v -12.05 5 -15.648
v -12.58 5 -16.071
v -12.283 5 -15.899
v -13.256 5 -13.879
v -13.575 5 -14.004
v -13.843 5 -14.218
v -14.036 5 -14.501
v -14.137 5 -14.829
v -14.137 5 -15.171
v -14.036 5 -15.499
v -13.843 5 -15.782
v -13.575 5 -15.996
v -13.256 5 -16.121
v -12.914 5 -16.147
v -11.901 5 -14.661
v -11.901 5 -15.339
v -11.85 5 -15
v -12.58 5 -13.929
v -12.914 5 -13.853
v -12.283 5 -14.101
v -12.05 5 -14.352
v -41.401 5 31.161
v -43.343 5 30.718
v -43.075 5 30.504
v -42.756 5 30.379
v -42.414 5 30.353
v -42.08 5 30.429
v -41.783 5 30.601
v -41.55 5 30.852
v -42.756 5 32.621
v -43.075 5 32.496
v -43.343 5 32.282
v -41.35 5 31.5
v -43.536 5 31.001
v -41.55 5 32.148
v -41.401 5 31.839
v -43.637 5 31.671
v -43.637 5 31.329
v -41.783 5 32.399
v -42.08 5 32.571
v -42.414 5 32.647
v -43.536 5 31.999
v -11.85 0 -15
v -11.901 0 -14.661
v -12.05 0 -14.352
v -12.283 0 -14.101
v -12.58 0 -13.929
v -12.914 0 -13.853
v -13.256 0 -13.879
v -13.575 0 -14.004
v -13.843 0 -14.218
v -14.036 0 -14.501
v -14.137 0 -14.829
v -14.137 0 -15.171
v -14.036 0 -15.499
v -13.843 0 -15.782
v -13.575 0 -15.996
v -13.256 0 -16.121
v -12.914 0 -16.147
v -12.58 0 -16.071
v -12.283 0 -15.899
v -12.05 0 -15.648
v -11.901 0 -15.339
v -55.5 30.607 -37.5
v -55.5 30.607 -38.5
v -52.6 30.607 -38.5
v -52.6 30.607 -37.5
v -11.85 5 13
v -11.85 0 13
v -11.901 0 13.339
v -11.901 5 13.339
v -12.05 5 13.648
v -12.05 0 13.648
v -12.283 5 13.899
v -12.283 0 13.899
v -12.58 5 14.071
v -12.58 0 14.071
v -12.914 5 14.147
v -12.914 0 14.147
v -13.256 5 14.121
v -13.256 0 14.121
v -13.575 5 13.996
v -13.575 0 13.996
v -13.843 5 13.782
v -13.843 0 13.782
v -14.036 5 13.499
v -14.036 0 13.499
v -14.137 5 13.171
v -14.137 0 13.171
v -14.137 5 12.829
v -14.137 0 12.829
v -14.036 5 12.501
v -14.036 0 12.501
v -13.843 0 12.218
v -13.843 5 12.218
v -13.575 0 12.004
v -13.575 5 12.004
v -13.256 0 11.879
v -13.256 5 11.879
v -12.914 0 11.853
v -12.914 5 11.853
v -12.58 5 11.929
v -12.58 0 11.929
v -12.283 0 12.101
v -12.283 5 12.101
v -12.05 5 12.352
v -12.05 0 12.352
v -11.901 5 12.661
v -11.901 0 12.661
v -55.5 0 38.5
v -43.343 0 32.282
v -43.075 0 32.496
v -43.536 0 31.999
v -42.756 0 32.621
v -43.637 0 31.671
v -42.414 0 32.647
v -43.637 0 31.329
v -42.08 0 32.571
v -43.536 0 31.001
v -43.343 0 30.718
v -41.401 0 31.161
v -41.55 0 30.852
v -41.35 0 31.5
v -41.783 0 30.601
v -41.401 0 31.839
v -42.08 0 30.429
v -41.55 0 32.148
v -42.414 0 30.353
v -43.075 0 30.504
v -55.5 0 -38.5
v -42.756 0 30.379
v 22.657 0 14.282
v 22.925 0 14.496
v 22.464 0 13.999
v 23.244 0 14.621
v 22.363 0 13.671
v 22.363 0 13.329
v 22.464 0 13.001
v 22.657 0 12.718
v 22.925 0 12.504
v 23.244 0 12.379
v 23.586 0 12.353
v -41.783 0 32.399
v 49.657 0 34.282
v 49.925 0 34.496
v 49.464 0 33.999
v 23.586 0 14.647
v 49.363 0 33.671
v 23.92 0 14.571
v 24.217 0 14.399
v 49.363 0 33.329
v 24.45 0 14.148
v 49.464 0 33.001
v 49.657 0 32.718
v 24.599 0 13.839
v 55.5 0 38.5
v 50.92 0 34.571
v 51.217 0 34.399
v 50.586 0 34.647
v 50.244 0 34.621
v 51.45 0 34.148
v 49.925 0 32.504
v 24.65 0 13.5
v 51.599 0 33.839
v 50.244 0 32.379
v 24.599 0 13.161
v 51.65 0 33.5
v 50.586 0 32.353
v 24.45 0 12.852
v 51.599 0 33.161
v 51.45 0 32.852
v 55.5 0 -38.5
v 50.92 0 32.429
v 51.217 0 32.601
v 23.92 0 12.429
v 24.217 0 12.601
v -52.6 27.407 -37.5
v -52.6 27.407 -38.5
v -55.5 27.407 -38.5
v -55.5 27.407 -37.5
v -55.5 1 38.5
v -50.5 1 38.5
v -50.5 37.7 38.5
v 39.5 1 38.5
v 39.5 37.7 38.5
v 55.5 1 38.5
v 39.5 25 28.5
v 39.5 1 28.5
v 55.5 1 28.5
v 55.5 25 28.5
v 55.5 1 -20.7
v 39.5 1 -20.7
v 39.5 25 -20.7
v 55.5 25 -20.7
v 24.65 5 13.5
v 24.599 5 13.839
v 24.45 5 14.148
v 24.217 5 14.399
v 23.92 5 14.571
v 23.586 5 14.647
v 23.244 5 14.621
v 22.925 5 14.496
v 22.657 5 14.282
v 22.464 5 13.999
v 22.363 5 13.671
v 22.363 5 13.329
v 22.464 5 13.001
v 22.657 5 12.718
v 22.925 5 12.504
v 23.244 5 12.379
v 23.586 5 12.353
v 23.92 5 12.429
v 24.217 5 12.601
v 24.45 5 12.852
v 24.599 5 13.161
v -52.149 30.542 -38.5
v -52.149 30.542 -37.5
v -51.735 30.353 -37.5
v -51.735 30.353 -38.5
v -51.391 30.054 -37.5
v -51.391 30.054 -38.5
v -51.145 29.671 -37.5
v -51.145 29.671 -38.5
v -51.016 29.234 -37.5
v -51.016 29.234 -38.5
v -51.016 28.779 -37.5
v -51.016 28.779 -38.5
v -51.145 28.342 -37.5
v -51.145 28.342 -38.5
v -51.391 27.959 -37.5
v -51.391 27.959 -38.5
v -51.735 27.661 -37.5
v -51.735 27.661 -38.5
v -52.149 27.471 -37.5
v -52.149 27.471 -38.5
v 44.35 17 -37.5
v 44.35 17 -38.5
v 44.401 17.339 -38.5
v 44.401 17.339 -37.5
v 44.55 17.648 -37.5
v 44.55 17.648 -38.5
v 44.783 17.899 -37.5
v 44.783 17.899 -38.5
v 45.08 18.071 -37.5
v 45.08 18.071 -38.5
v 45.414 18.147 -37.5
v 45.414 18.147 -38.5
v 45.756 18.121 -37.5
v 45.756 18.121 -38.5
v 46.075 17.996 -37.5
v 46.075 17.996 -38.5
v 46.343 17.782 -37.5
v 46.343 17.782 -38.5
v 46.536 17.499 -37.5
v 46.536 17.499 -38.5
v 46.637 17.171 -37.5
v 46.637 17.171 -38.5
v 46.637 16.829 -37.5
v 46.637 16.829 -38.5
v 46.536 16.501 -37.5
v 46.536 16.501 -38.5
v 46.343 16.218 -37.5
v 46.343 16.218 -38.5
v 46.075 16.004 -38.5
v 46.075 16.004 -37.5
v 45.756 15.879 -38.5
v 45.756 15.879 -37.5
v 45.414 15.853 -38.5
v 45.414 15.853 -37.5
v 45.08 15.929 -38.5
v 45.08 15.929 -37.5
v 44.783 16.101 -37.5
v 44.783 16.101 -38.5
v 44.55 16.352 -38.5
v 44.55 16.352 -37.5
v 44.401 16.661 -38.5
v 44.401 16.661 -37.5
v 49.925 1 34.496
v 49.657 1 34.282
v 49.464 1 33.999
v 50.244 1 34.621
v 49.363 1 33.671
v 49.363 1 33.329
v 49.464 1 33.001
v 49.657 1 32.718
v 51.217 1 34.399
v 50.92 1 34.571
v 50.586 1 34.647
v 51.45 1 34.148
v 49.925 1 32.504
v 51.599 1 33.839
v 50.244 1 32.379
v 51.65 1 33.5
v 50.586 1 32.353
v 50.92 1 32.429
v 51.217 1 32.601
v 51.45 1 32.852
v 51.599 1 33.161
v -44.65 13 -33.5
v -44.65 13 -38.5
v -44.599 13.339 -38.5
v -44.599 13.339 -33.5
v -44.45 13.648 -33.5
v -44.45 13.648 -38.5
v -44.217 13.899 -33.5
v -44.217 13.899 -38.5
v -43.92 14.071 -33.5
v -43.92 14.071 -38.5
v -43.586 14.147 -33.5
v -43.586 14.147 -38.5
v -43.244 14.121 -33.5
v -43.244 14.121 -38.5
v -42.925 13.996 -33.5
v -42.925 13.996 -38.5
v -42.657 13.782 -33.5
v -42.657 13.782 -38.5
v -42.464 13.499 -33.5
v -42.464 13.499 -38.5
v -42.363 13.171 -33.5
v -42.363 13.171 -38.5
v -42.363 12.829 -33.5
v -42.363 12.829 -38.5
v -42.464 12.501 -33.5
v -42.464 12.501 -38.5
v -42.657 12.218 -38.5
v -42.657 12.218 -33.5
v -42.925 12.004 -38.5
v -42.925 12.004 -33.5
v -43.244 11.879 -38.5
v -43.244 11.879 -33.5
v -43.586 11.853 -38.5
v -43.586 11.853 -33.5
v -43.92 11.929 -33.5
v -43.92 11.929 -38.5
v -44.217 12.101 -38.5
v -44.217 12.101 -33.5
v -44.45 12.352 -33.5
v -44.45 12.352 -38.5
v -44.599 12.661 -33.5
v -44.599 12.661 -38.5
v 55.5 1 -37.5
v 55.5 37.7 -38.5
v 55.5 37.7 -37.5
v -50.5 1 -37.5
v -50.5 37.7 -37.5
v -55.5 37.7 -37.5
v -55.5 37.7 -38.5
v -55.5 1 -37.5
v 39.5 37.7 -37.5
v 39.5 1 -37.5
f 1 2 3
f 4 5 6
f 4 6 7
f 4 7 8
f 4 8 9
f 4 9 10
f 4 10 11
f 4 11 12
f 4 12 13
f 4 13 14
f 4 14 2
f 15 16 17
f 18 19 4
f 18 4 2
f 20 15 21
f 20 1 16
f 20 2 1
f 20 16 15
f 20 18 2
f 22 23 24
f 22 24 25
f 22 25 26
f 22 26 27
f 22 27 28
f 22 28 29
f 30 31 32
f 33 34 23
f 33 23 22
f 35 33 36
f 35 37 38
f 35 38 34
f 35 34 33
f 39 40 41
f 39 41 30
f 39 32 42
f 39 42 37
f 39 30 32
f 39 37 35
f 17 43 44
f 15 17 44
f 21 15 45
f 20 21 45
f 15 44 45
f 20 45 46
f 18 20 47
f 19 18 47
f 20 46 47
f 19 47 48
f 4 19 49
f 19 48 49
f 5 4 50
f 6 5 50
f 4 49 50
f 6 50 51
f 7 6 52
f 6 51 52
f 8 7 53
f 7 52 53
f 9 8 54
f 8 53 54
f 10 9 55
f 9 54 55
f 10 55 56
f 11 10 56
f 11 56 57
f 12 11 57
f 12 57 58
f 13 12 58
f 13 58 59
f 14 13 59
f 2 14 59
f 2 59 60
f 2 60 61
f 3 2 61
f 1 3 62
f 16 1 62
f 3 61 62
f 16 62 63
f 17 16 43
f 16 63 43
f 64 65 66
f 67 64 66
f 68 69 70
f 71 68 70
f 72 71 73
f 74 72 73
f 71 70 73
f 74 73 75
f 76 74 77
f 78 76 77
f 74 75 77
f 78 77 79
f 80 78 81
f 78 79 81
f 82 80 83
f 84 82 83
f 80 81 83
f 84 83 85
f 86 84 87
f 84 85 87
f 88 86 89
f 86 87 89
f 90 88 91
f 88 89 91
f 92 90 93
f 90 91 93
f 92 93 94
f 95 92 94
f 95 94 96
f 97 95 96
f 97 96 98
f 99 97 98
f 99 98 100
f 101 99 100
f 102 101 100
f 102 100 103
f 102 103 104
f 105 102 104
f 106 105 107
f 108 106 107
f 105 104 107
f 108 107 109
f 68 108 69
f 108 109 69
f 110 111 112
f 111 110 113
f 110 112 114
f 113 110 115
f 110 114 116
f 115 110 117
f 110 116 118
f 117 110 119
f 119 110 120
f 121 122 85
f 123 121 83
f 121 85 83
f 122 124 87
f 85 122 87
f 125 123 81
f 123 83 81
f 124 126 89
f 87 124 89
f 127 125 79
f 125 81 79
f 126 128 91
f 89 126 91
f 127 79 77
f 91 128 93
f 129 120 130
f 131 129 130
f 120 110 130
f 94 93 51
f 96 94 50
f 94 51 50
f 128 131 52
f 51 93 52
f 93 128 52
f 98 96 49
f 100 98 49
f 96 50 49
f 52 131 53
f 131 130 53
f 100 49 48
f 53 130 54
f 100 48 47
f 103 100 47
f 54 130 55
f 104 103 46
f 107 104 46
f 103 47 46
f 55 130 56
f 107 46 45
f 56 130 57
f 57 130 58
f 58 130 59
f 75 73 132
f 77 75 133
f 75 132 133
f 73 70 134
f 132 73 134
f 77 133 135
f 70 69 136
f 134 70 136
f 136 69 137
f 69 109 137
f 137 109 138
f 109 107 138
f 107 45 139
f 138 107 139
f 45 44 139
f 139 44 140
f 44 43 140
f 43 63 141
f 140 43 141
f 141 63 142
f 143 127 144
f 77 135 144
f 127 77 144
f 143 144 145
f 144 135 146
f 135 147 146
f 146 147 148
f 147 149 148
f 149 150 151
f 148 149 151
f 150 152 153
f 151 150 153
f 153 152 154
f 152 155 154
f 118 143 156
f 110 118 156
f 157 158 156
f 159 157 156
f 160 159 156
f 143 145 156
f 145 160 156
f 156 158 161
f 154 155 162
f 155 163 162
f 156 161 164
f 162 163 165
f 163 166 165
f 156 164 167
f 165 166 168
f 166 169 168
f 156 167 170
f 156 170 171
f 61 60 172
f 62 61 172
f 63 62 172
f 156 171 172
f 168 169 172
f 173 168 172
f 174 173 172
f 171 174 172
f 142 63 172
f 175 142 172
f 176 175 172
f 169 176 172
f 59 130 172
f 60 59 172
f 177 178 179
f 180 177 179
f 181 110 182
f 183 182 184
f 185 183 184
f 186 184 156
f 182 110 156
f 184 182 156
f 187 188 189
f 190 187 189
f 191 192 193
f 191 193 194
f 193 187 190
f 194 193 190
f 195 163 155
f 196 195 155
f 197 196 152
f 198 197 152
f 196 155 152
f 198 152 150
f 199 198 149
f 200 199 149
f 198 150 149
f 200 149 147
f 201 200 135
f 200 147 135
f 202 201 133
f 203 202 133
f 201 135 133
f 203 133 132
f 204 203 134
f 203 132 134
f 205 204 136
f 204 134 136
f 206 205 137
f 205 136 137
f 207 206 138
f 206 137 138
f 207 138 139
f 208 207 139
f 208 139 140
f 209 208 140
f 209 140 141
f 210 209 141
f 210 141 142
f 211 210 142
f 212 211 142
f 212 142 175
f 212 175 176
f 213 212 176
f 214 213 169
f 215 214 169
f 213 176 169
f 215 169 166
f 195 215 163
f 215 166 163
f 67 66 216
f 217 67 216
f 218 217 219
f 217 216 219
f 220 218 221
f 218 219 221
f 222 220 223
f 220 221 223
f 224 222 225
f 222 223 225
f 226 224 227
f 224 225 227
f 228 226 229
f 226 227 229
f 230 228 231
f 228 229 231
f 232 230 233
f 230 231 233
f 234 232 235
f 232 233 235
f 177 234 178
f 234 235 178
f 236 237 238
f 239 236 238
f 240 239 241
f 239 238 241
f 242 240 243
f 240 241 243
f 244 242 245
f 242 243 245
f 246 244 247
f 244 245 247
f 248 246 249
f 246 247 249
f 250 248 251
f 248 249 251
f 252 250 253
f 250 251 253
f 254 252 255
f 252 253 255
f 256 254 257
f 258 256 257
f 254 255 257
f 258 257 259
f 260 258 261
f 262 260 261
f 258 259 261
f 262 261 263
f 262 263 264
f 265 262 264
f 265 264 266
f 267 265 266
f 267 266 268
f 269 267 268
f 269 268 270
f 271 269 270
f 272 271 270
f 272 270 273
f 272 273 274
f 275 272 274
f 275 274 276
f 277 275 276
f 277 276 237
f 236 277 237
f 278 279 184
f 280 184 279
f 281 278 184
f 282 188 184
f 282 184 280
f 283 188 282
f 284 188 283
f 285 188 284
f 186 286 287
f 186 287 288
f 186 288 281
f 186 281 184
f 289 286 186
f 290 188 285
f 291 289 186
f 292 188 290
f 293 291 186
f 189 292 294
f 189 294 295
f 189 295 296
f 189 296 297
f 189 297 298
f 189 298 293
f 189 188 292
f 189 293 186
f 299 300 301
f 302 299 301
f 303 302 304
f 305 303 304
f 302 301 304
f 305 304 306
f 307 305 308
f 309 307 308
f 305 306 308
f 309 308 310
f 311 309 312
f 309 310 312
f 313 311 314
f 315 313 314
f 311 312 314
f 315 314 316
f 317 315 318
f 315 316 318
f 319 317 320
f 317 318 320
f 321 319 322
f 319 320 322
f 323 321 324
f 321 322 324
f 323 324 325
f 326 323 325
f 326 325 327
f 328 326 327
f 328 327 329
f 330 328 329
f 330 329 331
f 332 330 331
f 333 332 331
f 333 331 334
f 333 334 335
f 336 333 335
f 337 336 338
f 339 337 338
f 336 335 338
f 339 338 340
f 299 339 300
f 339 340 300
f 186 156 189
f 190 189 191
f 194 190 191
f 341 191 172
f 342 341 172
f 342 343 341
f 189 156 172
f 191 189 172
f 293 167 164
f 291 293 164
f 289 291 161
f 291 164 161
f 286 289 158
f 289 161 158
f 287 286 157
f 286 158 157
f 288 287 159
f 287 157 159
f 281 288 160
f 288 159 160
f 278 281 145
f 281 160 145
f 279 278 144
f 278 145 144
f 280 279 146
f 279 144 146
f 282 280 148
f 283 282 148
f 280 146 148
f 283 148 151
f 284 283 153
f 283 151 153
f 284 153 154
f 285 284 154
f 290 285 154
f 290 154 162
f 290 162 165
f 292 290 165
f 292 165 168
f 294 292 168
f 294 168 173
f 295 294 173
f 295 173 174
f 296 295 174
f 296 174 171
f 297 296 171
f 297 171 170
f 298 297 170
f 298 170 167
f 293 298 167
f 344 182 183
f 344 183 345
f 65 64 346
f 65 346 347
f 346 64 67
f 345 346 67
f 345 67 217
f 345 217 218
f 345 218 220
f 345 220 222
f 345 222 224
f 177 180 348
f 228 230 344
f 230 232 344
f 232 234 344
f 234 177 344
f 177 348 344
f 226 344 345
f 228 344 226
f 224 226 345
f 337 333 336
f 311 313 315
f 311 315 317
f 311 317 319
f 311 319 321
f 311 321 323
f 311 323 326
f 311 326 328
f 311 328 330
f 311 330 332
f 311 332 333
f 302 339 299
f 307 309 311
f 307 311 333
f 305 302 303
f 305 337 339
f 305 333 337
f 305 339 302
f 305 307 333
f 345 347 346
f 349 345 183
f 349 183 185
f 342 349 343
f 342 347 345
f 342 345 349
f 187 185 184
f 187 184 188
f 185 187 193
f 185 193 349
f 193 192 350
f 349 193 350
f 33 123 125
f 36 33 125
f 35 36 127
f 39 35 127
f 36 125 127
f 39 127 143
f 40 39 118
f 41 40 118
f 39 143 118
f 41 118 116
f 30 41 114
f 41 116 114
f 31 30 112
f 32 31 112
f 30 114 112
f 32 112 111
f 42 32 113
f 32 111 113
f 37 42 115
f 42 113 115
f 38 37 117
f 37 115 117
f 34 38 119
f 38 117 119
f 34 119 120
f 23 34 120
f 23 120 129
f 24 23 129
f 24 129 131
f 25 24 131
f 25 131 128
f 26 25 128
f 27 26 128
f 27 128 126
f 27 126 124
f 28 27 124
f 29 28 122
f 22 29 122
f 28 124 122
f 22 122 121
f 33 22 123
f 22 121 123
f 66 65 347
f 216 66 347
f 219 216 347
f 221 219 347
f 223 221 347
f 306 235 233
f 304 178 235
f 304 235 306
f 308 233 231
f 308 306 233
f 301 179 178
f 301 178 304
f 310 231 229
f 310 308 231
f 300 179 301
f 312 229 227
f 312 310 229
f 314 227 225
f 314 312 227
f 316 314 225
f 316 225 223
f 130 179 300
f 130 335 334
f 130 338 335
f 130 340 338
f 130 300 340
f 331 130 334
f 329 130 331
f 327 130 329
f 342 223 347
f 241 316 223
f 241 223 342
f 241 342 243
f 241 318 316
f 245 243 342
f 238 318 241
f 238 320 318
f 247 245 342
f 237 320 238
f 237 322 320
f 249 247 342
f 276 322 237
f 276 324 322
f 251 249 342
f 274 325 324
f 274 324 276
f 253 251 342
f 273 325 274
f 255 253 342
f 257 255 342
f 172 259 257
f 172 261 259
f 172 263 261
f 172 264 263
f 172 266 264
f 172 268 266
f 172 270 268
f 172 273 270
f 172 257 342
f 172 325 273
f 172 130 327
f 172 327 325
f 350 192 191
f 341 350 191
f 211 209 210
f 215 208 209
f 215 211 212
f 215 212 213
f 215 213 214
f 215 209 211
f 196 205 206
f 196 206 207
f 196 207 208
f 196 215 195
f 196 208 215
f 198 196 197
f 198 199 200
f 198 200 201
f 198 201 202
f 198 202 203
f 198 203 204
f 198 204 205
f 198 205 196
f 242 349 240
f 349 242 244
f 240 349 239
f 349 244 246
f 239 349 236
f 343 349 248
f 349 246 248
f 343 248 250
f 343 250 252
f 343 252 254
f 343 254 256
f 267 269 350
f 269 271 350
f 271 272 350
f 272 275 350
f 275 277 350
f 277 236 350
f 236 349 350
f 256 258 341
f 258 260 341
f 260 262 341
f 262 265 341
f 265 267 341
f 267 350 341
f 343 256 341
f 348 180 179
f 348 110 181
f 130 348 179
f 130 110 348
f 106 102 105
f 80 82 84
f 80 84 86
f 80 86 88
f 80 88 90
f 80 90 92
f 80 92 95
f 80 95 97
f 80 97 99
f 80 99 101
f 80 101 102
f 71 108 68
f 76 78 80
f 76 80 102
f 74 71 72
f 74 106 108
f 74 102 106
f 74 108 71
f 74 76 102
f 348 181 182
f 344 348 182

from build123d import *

# Parameters (mm, degrees)
ESBO_O1_W                = 111
ESBO_O1_H                = 77
RESSALTO_EXTRUS_O1_DEPTH = 1
ESBO_O2_W                = 111
ESBO_O2_H                = 1
RESSALTO_EXTRUS_O2_DEPTH = 36.7
ESBO_O3_W                = 90
ESBO_O3_H                = 76
RESSALTO_EXTRUS_O3_DEPTH = 36.7
ESBO_O4_W                = 16
ESBO_O4_H                = 49.2
RESSALTO_EXTRUS_O4_DEPTH = 24
ESBO_O5_R                = 1.15
CORTE_EXTRUS_O1_DEPTH    = 5
ESBO_O6_R                = 1.15
CORTE_EXTRUS_O2_DEPTH    = 5


with BuildPart() as part:
    # Esboço1 → Ressalto-extrusão1 (new body)
    with BuildSketch(Plane(origin=(0, 0, 0), x_dir=(1, 0, 0), z_dir=(0, 1, 0))):
        Rectangle(ESBO_O1_W, ESBO_O1_H)
    extrude(amount=RESSALTO_EXTRUS_O1_DEPTH)

    # Esboço2 → Ressalto-extrusão2 (add)
    with BuildSketch(Plane(origin=(0, 1, 0), x_dir=(1, 0, 0), z_dir=(0, 1, 0))):
        with Locations((0, 38)):
            Rectangle(ESBO_O2_W, ESBO_O2_H)
    extrude(amount=RESSALTO_EXTRUS_O2_DEPTH)

    # Esboço3 → Ressalto-extrusão3 (add)
    with BuildSketch(Plane(origin=(0, 1, 0), x_dir=(1, 0, 0), z_dir=(0, 1, 0))):
        with Locations((-5.5, -0.5)):
            Rectangle(ESBO_O3_W, ESBO_O3_H)
    extrude(amount=RESSALTO_EXTRUS_O3_DEPTH)

    # Esboço4 → Ressalto-extrusão4 (add)
    with BuildSketch(Plane(origin=(0, 1, 0), x_dir=(1, 0, 0), z_dir=(0, 1, 0))):
        with Locations((47.5, -3.9)):
            Rectangle(ESBO_O4_W, ESBO_O4_H)
    extrude(amount=RESSALTO_EXTRUS_O4_DEPTH)

    # Esboço5 → Corte-extrusão1 (cut)
    with BuildSketch(Plane(origin=(0, 0, -38.5), x_dir=(-1, 0, 0), z_dir=(0, 0, -1))):
        with Locations((-45.5, 17)):
            Circle(ESBO_O5_R)
        with Locations((43.5, 13)):
            Circle(ESBO_O5_R)
        with BuildLine():
            Line((55.5, 30.606515891), (52.6, 30.606515891))
            ThreePointArc((52.6, 30.606515891), (51, 29.006515891), (52.6, 27.406515891))
            Line((52.6, 27.406515891), (55.5, 27.406515891))
            Line((55.5, 27.406515891), (55.5, 30.606515891))
        make_face()
    extrude(amount=-CORTE_EXTRUS_O1_DEPTH, mode=Mode.SUBTRACT)

    # Esboço6 → Corte-extrusão2 (cut)
    with BuildSketch(Plane.XZ):
        with Locations((-42.5, 31.5)):
            Circle(ESBO_O6_R)
        with Locations((50.5, 33.5)):
            Circle(ESBO_O6_R)
        with Locations((-13, 13)):
            Circle(ESBO_O6_R)
        with Locations((23.5, 13.5)):
            Circle(ESBO_O6_R)
        with Locations((-13, -15)):
            Circle(ESBO_O6_R)
    extrude(amount=-CORTE_EXTRUS_O2_DEPTH, mode=Mode.SUBTRACT)


solid = part.part
